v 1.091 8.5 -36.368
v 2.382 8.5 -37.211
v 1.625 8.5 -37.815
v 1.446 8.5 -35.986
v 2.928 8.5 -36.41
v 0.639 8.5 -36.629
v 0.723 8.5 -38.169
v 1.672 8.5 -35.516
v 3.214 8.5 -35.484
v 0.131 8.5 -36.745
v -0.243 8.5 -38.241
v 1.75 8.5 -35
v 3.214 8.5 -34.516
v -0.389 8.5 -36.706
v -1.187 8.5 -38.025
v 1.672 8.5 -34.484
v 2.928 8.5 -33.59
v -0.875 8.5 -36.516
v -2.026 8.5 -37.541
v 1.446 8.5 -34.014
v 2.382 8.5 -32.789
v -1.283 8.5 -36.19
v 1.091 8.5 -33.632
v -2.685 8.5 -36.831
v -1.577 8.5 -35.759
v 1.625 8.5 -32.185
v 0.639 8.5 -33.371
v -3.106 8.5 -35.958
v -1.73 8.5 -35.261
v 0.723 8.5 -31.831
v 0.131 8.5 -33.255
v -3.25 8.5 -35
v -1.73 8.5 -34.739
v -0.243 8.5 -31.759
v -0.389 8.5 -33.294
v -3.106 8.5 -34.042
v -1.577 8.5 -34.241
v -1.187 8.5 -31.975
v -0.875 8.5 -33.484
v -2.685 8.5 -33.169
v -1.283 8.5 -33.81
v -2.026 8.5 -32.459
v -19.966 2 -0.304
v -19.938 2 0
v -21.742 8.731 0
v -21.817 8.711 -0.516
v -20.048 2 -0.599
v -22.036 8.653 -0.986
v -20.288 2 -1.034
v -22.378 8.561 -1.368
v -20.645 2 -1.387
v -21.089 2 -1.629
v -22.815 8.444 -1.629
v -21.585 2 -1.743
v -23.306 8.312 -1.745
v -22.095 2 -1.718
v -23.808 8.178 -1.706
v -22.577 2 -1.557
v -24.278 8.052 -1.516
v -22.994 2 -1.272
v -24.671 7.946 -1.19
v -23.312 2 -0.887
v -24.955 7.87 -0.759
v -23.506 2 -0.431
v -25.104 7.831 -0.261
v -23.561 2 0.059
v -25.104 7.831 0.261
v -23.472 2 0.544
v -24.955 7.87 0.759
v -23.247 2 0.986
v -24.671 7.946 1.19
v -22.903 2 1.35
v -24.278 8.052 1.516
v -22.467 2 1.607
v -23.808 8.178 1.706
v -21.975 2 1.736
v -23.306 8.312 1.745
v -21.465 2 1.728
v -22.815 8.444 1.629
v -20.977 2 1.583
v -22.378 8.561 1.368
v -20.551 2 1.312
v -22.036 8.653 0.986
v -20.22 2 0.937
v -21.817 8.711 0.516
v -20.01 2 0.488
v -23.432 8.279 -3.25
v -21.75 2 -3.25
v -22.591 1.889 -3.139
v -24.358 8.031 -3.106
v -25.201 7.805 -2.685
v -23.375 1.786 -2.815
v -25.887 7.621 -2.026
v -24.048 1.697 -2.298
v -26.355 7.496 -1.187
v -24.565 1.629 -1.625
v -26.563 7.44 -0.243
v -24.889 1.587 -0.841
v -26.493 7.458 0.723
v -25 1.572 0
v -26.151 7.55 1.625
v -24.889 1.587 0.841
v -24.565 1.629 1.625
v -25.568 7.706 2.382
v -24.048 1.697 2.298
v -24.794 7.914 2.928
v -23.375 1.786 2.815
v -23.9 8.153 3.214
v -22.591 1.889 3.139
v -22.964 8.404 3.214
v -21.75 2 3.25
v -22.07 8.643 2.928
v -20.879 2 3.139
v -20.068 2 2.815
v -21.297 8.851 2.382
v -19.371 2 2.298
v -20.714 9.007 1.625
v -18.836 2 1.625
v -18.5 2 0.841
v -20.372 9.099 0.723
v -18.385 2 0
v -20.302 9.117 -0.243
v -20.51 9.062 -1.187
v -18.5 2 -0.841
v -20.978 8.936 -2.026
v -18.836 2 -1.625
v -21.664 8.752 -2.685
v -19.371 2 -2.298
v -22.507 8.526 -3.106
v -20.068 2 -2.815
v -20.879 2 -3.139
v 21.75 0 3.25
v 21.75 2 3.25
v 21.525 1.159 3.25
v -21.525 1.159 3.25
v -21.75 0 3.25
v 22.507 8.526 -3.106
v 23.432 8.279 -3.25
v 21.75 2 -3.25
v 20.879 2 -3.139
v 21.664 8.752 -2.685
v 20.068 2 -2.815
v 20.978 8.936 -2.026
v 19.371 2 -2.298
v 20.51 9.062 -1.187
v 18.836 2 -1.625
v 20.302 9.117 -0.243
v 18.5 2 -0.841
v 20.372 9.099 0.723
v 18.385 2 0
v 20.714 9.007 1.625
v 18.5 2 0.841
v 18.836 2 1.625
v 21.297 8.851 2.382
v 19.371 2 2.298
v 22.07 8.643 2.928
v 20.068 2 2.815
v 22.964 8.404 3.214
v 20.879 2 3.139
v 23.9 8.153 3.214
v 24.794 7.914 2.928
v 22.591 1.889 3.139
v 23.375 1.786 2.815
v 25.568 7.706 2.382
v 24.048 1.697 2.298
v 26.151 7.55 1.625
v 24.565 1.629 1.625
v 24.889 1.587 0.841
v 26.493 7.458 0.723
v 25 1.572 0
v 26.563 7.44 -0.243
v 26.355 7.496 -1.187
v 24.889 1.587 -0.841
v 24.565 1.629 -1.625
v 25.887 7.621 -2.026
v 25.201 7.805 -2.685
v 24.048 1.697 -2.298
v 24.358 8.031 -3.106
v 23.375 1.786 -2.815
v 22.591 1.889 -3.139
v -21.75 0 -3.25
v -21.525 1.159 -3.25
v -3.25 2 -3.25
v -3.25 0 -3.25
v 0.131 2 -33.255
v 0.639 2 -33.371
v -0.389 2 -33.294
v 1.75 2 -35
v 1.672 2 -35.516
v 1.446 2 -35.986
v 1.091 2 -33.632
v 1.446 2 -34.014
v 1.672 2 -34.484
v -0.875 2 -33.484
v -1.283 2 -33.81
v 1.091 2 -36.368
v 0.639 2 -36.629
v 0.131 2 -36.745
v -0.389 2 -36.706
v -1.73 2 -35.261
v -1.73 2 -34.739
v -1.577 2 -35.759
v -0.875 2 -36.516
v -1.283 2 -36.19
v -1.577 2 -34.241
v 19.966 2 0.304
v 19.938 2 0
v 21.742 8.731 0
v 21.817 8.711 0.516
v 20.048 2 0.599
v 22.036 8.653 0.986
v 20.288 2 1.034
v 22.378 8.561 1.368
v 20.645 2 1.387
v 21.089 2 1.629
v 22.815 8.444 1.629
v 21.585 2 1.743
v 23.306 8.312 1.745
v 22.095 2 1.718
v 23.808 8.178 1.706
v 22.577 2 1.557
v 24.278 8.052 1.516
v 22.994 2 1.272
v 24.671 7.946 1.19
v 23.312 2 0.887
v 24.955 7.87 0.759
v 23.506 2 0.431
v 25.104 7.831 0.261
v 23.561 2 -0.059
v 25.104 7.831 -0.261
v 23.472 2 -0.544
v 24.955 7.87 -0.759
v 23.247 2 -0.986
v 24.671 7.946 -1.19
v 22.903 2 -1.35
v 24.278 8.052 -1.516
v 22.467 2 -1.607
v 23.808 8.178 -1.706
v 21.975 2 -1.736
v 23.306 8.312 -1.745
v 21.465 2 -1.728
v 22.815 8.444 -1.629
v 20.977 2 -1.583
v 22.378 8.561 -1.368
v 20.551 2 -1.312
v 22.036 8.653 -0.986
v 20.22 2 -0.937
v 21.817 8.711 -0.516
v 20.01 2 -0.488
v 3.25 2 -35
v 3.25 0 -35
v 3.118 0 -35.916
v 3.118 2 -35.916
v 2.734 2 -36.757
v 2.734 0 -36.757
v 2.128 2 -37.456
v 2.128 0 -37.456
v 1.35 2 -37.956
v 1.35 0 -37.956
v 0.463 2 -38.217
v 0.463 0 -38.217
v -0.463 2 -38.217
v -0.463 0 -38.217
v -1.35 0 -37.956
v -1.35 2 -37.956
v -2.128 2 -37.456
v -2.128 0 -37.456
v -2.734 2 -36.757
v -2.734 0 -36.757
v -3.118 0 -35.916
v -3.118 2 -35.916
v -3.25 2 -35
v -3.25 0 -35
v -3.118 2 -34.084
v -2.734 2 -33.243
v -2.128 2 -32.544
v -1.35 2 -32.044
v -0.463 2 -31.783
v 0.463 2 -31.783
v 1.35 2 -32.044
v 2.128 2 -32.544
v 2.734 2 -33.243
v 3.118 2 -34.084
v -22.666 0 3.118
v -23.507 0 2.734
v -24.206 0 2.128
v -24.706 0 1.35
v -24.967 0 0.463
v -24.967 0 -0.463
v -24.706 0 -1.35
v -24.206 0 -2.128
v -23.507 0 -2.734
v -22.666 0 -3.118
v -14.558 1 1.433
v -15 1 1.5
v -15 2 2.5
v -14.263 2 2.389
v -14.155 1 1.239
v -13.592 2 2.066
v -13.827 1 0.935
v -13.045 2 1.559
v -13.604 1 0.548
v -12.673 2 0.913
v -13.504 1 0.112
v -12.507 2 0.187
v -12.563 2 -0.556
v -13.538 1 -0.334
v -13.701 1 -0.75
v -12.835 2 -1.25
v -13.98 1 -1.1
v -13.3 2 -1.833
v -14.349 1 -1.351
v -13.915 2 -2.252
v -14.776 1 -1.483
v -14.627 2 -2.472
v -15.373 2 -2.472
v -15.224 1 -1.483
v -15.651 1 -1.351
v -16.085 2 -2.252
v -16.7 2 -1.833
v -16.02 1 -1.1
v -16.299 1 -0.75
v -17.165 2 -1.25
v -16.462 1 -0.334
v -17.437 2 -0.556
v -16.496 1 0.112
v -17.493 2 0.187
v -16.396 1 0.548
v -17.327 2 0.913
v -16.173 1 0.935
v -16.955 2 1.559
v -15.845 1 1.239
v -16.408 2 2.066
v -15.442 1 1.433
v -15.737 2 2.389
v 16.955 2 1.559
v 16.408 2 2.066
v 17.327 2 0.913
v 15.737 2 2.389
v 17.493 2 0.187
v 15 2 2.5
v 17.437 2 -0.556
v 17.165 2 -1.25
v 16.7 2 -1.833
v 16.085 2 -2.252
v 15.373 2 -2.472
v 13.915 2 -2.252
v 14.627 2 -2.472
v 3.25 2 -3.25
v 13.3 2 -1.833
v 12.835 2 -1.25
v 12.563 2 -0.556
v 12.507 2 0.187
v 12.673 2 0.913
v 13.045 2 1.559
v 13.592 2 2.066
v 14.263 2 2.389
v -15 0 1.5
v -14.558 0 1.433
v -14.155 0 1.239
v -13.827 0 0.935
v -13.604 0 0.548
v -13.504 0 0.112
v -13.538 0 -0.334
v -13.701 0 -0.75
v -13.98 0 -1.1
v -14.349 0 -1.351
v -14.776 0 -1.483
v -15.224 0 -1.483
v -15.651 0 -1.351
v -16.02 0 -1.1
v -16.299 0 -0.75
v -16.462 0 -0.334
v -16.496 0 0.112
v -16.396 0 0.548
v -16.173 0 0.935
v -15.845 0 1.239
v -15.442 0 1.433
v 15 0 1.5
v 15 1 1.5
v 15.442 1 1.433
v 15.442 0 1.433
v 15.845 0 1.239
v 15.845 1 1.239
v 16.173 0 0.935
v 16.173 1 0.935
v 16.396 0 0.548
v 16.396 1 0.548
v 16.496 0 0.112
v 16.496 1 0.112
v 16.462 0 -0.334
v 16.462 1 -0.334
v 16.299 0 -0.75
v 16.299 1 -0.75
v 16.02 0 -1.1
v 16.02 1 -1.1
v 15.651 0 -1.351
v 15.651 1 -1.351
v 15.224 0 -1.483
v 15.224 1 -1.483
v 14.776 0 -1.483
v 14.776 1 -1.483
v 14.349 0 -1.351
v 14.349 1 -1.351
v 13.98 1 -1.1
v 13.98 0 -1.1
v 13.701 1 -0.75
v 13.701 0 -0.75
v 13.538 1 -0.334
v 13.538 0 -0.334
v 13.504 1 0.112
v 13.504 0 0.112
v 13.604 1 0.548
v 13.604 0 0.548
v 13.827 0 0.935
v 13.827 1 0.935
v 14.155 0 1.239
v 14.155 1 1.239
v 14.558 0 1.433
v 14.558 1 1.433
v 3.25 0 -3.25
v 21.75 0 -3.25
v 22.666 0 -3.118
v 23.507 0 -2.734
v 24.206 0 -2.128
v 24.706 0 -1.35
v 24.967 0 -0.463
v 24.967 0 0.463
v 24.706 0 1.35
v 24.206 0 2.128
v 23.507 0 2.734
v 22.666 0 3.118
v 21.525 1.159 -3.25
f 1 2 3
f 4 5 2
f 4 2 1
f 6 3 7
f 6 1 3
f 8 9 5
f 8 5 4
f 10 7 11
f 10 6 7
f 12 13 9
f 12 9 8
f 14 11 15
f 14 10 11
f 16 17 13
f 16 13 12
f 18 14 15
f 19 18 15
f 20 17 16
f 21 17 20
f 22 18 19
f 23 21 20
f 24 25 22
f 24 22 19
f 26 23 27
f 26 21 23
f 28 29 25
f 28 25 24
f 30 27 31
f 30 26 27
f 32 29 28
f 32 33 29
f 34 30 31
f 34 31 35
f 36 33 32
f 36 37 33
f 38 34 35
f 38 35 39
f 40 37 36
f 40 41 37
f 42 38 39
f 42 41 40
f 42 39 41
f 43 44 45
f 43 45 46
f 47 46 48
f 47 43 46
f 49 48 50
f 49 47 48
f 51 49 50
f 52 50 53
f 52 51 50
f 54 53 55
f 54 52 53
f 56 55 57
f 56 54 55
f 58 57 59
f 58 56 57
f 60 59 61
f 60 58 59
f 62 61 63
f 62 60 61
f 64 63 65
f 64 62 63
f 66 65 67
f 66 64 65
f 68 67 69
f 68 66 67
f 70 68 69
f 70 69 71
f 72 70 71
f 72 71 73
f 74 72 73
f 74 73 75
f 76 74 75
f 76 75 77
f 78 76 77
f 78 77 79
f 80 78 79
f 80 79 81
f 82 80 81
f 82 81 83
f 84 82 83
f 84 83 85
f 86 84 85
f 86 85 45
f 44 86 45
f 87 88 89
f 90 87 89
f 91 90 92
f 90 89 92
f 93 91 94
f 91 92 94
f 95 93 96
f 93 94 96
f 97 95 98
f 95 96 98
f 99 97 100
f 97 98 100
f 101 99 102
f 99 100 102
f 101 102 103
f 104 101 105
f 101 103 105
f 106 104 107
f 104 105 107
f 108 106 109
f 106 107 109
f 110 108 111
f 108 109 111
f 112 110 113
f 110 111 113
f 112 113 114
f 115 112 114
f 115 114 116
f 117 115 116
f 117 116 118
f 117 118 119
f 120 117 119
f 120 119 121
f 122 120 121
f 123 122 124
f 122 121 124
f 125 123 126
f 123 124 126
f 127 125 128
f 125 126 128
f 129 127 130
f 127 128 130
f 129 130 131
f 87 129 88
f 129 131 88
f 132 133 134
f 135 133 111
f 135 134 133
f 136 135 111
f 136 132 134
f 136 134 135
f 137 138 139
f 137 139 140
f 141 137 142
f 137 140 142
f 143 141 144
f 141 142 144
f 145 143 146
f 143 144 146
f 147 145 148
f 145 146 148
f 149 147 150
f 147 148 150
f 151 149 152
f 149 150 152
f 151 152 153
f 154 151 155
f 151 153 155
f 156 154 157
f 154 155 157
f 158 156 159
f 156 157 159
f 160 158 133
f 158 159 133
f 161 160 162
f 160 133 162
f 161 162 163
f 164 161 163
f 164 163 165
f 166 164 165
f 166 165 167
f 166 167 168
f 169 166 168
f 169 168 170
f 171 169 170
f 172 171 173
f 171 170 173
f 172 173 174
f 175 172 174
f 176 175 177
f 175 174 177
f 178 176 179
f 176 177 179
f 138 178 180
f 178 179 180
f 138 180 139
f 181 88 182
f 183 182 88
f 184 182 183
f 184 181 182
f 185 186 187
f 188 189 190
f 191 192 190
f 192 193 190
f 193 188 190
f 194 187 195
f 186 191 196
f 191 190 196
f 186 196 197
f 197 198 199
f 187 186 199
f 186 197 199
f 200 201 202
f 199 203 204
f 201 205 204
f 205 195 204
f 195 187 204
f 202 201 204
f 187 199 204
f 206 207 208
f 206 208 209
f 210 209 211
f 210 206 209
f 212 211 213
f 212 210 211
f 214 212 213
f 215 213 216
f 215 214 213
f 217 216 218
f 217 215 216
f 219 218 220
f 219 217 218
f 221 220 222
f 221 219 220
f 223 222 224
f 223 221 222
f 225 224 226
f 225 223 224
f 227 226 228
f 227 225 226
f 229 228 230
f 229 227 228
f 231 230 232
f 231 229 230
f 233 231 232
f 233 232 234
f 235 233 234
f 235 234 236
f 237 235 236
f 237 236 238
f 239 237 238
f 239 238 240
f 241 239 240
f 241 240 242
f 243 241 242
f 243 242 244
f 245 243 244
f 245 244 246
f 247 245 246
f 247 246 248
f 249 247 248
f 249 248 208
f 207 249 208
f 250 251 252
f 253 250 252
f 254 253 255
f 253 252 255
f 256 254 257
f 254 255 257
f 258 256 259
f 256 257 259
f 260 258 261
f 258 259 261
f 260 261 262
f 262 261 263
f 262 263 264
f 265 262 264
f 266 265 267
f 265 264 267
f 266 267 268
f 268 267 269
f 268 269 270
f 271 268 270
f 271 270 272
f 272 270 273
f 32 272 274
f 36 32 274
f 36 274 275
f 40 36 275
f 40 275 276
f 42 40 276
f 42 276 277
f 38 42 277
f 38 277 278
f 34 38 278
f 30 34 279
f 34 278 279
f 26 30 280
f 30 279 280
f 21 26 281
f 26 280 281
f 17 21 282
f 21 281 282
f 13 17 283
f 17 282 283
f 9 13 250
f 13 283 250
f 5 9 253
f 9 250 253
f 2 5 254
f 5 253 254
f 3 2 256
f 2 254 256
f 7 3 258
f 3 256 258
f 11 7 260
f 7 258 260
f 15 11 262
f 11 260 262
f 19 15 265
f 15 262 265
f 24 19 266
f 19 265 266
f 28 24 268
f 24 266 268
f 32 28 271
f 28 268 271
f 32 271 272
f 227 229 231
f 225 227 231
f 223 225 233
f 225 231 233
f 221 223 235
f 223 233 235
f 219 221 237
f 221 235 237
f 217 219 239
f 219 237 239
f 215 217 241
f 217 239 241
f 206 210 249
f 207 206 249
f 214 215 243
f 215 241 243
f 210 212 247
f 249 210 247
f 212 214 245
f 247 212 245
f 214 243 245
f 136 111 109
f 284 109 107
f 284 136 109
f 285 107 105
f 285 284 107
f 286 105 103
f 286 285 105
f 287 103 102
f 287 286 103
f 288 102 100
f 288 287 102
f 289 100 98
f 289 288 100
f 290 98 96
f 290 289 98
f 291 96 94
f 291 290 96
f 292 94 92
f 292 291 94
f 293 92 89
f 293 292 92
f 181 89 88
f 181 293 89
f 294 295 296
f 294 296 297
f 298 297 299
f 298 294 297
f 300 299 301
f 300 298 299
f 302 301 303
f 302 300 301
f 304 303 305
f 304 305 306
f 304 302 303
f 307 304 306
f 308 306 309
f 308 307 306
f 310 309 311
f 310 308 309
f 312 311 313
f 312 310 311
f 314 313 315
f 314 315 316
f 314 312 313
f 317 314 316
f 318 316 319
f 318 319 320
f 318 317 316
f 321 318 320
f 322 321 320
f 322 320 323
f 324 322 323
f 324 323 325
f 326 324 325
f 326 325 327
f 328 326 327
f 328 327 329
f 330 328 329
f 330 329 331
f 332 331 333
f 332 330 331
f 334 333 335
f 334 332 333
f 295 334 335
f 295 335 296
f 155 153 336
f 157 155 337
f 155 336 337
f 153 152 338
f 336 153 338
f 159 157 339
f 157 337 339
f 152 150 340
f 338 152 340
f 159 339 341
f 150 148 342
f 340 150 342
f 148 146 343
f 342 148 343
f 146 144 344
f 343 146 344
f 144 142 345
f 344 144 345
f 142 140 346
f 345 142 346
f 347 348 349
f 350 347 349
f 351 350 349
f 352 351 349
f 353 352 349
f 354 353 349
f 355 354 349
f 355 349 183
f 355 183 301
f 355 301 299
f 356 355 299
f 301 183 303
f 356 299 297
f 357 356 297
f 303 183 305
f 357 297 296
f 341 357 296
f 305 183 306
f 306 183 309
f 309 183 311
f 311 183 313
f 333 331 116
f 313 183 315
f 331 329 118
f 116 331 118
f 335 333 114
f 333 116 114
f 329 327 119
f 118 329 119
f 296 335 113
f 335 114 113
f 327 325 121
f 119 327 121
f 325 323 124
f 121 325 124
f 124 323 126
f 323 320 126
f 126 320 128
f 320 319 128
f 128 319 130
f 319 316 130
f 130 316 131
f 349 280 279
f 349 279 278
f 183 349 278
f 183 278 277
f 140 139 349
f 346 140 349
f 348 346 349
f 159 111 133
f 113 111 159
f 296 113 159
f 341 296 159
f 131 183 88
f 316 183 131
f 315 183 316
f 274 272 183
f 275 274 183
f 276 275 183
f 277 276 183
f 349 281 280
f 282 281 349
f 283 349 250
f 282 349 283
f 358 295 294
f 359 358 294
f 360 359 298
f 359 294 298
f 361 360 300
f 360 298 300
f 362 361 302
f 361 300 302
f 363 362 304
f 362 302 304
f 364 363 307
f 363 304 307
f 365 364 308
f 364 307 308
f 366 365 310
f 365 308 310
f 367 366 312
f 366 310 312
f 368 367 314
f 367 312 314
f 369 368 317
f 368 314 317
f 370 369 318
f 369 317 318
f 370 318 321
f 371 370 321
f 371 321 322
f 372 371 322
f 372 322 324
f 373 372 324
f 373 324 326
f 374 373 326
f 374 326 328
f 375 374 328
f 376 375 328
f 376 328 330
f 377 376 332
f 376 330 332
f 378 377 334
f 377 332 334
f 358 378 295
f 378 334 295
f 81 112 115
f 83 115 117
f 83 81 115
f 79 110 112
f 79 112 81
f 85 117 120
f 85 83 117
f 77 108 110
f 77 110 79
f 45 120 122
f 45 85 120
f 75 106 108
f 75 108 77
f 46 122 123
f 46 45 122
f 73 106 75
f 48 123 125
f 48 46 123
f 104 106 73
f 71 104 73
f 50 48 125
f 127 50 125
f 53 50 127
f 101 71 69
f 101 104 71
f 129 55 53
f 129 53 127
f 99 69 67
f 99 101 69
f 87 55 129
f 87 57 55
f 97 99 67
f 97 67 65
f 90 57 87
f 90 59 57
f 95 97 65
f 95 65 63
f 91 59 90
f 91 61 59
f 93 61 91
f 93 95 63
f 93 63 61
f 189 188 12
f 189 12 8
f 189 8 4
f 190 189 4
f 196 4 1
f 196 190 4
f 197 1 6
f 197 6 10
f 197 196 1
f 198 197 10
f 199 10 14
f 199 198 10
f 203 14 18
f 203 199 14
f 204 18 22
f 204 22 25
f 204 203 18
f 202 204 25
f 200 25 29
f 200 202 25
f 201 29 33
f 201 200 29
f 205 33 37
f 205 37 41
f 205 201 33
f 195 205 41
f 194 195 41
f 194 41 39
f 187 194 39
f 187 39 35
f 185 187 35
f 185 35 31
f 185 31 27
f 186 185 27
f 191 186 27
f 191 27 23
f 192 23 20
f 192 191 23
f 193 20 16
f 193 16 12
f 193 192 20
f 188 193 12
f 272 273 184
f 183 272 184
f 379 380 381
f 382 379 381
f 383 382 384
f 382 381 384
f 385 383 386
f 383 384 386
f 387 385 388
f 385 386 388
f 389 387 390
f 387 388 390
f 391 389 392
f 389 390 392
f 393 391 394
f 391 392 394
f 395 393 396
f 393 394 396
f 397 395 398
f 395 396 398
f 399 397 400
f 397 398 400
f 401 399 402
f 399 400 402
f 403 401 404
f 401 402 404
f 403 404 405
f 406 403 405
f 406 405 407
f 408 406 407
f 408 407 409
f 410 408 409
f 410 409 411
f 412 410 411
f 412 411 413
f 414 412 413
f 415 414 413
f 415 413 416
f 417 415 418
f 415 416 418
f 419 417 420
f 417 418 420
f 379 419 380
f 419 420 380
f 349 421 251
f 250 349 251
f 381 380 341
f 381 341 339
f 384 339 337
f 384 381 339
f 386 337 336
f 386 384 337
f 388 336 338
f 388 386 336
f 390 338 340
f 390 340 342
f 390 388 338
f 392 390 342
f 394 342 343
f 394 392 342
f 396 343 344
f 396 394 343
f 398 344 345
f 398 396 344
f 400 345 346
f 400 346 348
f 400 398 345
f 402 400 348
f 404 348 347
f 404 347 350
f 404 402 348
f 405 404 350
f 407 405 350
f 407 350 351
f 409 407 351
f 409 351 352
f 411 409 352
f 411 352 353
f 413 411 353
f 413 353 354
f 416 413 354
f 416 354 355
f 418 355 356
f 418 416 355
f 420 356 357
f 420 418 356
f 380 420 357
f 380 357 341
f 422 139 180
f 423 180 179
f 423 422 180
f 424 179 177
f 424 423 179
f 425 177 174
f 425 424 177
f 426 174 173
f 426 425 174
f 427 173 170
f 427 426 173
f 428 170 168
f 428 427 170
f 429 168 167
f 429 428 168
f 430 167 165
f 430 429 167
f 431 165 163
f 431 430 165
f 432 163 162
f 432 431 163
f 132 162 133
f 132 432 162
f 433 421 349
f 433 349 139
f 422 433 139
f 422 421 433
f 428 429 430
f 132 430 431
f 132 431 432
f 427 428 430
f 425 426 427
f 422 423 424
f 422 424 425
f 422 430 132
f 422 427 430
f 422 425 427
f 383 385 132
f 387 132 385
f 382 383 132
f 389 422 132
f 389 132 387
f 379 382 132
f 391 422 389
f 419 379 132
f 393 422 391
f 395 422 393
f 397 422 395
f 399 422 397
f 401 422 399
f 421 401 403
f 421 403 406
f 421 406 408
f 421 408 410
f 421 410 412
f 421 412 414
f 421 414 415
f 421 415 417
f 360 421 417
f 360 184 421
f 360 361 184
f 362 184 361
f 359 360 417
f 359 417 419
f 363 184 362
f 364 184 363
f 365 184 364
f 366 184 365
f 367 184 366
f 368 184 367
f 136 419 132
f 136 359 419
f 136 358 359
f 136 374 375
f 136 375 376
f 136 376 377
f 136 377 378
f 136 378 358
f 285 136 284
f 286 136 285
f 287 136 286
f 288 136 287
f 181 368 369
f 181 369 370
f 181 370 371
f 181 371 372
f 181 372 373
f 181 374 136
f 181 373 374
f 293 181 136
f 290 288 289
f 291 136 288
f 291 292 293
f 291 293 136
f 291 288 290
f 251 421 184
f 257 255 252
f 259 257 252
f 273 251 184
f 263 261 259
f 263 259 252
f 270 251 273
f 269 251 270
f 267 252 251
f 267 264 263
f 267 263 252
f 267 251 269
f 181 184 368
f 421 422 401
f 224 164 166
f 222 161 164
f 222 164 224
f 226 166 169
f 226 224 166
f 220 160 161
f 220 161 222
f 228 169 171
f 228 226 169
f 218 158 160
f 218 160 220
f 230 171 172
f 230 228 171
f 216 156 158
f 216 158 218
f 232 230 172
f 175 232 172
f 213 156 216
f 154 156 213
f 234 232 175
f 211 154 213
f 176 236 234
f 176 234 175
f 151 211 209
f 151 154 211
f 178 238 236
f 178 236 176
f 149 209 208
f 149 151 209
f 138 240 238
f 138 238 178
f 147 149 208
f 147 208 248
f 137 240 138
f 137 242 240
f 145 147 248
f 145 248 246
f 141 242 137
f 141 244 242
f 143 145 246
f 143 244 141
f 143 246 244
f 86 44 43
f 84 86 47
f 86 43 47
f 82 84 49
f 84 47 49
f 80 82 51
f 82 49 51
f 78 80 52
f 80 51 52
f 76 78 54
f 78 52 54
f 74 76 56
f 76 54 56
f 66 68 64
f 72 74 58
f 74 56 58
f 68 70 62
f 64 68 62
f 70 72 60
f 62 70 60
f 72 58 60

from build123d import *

# Parameters (mm, degrees)
BOSS_EXTRUDE1_DEPTH = 2
BOSS_EXTRUDE4_DEPTH = 2
SKETCH6_R           = 3.25
SKETCH6_R_2         = 1.75
BOSS_EXTRUDE5_DEPTH = 6.5
BOSS_EXTRUDE2_START = -0.870835
SKETCH2_R           = 3.25
SKETCH2_R_2         = 1.75
BOSS_EXTRUDE2_DEPTH = 7.370835
BOSS_EXTRUDE3_START = -0.870835
SKETCH3_R           = 3.25
SKETCH3_R_2         = 1.75
BOSS_EXTRUDE3_DEPTH = 7.370835
SKETCH4_R           = 1.5
CUT_EXTRUDE1_DEPTH  = 2
CHAMFER1_SIZE       = 1


with BuildPart() as part:
    # Sketch1 → Boss-Extrude1 (new body)
    with BuildSketch(Plane(origin=(0, 0, 0), x_dir=(1, 0, 0), z_dir=(0, 1, 0))):
        with BuildLine():
            Line((-21.75, 3.25), (21.75, 3.25))
            ThreePointArc((21.75, 3.25), (25, 0), (21.75, -3.25))
            Line((21.75, -3.25), (-21.75, -3.25))
            ThreePointArc((-21.75, -3.25), (-25, 0), (-21.75, 3.25))
        make_face()
    extrude(amount=BOSS_EXTRUDE1_DEPTH)

    # Sketch5 → Boss-Extrude4 (add)
    with BuildSketch(Plane(origin=(0, 0, 0), x_dir=(1, 0, 0), z_dir=(0, 1, 0))):
        with BuildLine():
            Line((-3.25, 0), (3.25, 0))
            Line((3.25, 0), (3.25, 35))
            ThreePointArc((3.25, 35), (0, 38.25), (-3.25, 35))
            Line((-3.25, 35), (-3.25, 0))
        make_face()
    extrude(amount=BOSS_EXTRUDE4_DEPTH)

    # Sketch6 → Boss-Extrude5 (add)
    with BuildSketch(Plane(origin=(0, 2, 0), x_dir=(1, 0, 0), z_dir=(0, 1, 0))):
        with Locations(Location((0, 35, 0), (0, 0, 180))):
            Circle(SKETCH6_R)
        with Locations((0, 35)):
            Circle(SKETCH6_R_2, mode=Mode.SUBTRACT)
    extrude(amount=BOSS_EXTRUDE5_DEPTH)

    # Sketch2 → Boss-Extrude2 (add)
    with BuildSketch(Plane(origin=(-1.956973734, 7.303525404, 0), x_dir=(0, 0, -1), z_dir=(-0.25881904510252135, 0.9659258262890681, 0)).offset(BOSS_EXTRUDE2_START)):
        with Locations((0, 20.491248632)):
            Circle(SKETCH2_R)
        with Locations(Location((0, 20.491248632, 0), (0, 0, 270))):
            Circle(SKETCH2_R_2, mode=Mode.SUBTRACT)
    extrude(amount=BOSS_EXTRUDE2_DEPTH)

    # Sketch3 → Boss-Extrude3 (add)
    with BuildSketch(Plane(origin=(1.956973734, 7.303525404, 0), x_dir=(0, 0, -1), z_dir=(0.25881904510252135, 0.9659258262890681, 0)).offset(BOSS_EXTRUDE3_START)):
        with Locations((0, -20.491248632)):
            Circle(SKETCH3_R)
        with Locations(Location((0, -20.491248632, 0), (0, 0, 90))):
            Circle(SKETCH3_R_2, mode=Mode.SUBTRACT)
    extrude(amount=BOSS_EXTRUDE3_DEPTH)

    # Sketch4 → Cut-Extrude1 (cut)
    with BuildSketch(Plane(origin=(0, 2, 0), x_dir=(1, 0, 0), z_dir=(0, 1, 0))):
        with Locations(Location((-15, 0, 0), (0, 0, 270))):
            Circle(SKETCH4_R)
        with Locations(Location((15, 0, 0), (0, 0, 270))):
            Circle(SKETCH4_R)
    extrude(amount=-CUT_EXTRUDE1_DEPTH, mode=Mode.SUBTRACT)

    # Chamfer1
    chamfer1_edges = [part.edges().sort_by_distance(p)[0] for p in [
        (-15, 2, -1.5),
        (15, 2, -1.5),
    ]]
    chamfer(chamfer1_edges, length=CHAMFER1_SIZE)


solid = part.part
